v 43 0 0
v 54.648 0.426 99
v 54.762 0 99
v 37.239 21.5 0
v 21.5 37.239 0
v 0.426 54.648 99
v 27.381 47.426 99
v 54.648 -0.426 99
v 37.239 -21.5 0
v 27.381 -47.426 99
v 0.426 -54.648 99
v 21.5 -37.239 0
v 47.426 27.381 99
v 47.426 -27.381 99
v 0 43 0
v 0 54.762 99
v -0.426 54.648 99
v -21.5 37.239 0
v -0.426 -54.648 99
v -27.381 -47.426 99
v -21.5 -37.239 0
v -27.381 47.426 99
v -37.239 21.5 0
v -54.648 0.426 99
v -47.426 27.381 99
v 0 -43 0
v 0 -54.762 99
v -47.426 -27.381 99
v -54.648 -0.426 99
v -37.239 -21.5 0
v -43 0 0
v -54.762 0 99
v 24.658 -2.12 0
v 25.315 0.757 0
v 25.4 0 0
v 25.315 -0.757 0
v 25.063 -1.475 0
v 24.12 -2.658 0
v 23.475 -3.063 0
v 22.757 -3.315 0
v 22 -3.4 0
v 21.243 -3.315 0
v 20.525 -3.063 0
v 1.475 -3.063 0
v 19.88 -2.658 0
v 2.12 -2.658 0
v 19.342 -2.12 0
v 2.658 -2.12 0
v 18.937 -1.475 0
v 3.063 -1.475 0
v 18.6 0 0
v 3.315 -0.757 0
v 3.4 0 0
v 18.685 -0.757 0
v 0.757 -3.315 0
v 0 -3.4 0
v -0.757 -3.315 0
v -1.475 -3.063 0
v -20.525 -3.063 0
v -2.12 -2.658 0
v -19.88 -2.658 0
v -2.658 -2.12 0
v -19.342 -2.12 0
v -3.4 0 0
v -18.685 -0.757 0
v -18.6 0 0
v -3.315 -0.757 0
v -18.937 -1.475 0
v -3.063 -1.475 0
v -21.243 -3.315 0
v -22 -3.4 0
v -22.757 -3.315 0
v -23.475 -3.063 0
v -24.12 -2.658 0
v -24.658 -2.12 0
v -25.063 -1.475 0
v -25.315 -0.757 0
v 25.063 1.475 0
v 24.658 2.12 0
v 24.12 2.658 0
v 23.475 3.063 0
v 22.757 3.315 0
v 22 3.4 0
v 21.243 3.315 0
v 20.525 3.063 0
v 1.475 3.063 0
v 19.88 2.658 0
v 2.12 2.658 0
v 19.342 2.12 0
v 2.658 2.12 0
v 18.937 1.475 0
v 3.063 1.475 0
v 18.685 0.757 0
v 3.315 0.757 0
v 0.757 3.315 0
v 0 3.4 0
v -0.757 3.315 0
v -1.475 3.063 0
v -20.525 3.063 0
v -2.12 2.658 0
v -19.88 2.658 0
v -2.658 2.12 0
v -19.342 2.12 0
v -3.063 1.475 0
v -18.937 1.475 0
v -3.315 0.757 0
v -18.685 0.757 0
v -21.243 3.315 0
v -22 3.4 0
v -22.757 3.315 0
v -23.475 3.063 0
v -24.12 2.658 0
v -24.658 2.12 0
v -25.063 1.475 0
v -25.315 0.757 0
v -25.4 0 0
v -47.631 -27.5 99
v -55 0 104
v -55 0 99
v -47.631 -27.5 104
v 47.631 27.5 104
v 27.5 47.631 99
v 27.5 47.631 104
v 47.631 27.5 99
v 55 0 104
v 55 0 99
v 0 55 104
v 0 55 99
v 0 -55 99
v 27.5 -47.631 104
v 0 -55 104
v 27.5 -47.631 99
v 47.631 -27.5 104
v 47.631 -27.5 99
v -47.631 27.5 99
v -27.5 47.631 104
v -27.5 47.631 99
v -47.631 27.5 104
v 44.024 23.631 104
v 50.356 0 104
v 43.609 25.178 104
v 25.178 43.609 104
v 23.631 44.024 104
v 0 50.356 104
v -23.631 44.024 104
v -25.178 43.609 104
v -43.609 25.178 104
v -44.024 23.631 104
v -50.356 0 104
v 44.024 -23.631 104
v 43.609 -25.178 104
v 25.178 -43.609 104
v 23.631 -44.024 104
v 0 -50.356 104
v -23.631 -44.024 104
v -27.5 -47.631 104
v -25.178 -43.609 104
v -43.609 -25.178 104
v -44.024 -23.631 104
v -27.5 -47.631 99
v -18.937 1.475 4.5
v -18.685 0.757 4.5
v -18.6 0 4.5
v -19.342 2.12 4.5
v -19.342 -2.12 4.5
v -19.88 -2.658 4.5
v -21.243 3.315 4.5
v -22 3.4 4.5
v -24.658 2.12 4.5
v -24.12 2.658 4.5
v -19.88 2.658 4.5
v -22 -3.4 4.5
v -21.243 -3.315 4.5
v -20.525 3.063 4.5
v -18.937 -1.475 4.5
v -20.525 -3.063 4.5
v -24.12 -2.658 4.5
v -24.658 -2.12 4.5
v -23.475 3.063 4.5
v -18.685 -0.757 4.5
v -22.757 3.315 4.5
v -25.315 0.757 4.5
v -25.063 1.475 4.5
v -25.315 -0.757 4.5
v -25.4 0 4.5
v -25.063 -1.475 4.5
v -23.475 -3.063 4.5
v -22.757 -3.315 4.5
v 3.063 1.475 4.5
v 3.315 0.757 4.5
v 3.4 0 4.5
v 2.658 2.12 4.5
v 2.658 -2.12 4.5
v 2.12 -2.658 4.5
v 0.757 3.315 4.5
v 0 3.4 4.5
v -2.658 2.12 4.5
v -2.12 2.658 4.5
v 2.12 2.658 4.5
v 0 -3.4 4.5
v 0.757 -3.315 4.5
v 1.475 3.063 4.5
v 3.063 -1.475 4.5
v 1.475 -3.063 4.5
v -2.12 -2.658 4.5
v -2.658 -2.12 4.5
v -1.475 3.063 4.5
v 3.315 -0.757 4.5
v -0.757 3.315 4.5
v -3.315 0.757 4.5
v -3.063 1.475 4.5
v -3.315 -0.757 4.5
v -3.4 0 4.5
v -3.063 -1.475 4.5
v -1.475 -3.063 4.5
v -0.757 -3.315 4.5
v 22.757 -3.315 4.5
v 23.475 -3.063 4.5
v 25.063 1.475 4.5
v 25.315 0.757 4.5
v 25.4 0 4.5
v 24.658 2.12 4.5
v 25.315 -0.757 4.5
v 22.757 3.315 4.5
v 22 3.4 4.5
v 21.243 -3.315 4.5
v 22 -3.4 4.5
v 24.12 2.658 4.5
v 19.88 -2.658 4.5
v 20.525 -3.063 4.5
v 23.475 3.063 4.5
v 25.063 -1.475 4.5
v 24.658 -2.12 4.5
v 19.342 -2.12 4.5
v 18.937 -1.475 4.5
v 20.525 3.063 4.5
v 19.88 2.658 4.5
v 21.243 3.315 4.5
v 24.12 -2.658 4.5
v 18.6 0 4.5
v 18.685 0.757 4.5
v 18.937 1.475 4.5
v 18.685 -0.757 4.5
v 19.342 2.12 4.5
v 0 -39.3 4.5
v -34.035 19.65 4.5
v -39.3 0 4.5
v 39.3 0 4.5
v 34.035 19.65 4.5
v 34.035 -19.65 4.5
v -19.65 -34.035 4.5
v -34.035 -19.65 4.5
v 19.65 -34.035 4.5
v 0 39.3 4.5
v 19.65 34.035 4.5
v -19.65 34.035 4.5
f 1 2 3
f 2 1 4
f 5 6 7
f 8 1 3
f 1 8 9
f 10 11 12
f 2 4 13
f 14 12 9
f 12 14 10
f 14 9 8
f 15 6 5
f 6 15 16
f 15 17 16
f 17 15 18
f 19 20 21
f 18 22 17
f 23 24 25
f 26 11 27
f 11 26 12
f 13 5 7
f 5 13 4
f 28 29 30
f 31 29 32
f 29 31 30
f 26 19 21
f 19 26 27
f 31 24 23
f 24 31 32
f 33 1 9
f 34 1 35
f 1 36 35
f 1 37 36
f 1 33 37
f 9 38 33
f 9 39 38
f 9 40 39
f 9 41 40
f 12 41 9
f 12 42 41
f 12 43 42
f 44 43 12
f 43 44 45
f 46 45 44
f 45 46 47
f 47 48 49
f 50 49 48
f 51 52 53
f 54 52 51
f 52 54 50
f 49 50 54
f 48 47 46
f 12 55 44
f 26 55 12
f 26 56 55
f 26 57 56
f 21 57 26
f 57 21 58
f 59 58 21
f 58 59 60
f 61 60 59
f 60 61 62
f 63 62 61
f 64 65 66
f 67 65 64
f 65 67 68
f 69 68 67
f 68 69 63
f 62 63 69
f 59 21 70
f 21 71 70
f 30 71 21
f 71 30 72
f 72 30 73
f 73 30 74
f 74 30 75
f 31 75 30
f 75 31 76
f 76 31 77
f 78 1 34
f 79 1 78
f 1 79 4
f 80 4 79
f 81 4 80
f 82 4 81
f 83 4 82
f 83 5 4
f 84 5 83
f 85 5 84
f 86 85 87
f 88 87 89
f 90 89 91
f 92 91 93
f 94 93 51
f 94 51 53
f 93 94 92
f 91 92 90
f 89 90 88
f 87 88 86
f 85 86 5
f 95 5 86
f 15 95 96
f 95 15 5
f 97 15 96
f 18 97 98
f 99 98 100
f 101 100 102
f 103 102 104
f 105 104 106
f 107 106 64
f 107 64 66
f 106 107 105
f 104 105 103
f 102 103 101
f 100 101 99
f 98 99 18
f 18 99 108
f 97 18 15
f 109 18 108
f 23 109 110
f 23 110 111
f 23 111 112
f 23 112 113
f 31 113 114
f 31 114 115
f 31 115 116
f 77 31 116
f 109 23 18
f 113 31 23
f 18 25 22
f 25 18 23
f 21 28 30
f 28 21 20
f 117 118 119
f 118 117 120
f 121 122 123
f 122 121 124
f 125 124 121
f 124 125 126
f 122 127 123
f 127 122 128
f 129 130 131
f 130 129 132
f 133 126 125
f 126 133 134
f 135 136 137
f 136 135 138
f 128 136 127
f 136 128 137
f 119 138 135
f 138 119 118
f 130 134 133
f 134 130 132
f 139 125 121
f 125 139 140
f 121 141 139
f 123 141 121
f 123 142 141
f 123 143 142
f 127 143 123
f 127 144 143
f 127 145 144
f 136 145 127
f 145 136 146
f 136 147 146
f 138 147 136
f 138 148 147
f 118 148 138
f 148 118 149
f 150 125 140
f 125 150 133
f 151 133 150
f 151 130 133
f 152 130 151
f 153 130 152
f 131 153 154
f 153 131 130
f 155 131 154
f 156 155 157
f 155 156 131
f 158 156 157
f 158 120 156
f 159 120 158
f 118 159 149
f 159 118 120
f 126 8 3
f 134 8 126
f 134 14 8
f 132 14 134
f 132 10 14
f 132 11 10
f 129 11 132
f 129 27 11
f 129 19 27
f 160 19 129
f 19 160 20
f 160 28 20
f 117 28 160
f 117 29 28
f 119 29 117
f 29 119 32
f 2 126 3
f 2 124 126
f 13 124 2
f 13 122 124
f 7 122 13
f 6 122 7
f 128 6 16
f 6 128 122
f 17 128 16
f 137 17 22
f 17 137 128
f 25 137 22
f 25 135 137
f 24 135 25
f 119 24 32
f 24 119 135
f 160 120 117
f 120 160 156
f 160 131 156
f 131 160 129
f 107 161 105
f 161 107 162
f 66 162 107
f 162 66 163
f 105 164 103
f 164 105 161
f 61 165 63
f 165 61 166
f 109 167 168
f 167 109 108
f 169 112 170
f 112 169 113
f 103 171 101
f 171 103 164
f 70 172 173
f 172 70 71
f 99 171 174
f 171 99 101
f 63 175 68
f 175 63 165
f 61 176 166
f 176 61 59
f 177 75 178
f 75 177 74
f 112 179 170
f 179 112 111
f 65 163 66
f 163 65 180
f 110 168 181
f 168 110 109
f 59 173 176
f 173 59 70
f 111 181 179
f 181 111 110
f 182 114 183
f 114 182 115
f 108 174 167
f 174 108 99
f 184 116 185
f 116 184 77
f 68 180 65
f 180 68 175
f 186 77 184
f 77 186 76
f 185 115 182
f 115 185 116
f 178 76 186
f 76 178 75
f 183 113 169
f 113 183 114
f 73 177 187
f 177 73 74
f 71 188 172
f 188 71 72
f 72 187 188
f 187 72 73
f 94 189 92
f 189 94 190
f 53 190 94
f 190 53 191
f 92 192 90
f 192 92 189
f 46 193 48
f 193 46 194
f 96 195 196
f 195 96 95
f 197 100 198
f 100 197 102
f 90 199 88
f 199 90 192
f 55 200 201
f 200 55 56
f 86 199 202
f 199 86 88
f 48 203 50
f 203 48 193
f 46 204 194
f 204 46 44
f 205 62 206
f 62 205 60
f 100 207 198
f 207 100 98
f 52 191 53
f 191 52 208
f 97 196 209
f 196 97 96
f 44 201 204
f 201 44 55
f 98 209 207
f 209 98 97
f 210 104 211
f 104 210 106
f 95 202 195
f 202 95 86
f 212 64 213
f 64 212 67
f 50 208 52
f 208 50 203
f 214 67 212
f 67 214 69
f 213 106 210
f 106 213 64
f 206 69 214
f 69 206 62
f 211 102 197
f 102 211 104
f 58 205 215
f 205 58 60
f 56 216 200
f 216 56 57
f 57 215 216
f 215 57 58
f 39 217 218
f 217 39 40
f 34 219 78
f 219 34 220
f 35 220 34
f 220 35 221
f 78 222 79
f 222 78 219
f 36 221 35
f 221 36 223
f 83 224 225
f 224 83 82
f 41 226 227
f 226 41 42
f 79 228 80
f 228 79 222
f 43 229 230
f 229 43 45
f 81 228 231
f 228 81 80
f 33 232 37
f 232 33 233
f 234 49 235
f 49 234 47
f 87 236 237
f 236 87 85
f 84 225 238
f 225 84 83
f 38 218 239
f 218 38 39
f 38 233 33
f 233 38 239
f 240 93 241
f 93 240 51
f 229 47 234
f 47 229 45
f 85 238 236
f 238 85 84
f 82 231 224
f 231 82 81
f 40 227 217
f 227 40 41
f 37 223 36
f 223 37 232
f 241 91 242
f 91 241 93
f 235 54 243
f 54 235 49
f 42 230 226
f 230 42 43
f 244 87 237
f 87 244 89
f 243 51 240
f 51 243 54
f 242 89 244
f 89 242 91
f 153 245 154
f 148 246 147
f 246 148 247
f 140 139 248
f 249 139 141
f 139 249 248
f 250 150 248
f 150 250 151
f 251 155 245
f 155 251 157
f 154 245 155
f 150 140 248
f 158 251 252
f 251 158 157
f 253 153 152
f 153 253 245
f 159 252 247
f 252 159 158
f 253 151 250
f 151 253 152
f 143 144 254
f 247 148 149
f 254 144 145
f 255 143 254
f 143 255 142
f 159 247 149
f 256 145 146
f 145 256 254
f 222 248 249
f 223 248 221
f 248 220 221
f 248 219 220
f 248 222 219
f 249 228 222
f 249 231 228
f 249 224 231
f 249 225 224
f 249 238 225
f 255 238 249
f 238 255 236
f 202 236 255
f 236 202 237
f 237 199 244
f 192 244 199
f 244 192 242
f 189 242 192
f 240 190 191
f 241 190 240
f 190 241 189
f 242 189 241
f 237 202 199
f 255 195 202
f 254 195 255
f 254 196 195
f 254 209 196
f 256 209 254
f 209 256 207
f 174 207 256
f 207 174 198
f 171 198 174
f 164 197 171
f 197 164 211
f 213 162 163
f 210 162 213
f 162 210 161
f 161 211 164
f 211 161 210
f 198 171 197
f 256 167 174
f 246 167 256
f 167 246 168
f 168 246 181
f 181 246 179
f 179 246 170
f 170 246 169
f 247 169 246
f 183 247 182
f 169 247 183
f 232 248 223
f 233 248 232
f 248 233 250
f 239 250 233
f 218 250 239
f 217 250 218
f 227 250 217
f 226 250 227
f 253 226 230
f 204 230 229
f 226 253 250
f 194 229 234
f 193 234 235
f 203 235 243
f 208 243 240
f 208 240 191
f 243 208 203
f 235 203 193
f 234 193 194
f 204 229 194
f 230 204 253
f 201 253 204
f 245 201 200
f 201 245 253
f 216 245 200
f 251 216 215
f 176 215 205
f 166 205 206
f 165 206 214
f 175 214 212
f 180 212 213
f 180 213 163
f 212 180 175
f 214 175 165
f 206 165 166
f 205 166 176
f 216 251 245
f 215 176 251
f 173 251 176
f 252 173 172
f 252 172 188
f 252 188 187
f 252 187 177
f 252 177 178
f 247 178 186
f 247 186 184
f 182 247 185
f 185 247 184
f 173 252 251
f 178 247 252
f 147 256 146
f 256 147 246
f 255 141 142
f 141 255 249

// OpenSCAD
// SPDX-License-Identifier: MIT
// Geo Cactus Planter | 3D Worlds overseas batch 02 | original, unverified CAD.
// Millimeters; Z-up; fixed published envelope W x D x H = 110 x 110 x 104.
// Retain previous v1.3 family/variant metadata for compatible exporter validation.
use <lib/commerce_forms.scad>
use <lib/refined_batch02_forms.scad>
w = 110; d = 110; h = 104;
// Edit label below where applicable. Do not assume lettering / openings fit every input.
label = "CUSTOM";
refined_batch02_form(slug="geo-cactus-planter",family="planter",variant=2,w=w,d=d,h=h,label=label);
